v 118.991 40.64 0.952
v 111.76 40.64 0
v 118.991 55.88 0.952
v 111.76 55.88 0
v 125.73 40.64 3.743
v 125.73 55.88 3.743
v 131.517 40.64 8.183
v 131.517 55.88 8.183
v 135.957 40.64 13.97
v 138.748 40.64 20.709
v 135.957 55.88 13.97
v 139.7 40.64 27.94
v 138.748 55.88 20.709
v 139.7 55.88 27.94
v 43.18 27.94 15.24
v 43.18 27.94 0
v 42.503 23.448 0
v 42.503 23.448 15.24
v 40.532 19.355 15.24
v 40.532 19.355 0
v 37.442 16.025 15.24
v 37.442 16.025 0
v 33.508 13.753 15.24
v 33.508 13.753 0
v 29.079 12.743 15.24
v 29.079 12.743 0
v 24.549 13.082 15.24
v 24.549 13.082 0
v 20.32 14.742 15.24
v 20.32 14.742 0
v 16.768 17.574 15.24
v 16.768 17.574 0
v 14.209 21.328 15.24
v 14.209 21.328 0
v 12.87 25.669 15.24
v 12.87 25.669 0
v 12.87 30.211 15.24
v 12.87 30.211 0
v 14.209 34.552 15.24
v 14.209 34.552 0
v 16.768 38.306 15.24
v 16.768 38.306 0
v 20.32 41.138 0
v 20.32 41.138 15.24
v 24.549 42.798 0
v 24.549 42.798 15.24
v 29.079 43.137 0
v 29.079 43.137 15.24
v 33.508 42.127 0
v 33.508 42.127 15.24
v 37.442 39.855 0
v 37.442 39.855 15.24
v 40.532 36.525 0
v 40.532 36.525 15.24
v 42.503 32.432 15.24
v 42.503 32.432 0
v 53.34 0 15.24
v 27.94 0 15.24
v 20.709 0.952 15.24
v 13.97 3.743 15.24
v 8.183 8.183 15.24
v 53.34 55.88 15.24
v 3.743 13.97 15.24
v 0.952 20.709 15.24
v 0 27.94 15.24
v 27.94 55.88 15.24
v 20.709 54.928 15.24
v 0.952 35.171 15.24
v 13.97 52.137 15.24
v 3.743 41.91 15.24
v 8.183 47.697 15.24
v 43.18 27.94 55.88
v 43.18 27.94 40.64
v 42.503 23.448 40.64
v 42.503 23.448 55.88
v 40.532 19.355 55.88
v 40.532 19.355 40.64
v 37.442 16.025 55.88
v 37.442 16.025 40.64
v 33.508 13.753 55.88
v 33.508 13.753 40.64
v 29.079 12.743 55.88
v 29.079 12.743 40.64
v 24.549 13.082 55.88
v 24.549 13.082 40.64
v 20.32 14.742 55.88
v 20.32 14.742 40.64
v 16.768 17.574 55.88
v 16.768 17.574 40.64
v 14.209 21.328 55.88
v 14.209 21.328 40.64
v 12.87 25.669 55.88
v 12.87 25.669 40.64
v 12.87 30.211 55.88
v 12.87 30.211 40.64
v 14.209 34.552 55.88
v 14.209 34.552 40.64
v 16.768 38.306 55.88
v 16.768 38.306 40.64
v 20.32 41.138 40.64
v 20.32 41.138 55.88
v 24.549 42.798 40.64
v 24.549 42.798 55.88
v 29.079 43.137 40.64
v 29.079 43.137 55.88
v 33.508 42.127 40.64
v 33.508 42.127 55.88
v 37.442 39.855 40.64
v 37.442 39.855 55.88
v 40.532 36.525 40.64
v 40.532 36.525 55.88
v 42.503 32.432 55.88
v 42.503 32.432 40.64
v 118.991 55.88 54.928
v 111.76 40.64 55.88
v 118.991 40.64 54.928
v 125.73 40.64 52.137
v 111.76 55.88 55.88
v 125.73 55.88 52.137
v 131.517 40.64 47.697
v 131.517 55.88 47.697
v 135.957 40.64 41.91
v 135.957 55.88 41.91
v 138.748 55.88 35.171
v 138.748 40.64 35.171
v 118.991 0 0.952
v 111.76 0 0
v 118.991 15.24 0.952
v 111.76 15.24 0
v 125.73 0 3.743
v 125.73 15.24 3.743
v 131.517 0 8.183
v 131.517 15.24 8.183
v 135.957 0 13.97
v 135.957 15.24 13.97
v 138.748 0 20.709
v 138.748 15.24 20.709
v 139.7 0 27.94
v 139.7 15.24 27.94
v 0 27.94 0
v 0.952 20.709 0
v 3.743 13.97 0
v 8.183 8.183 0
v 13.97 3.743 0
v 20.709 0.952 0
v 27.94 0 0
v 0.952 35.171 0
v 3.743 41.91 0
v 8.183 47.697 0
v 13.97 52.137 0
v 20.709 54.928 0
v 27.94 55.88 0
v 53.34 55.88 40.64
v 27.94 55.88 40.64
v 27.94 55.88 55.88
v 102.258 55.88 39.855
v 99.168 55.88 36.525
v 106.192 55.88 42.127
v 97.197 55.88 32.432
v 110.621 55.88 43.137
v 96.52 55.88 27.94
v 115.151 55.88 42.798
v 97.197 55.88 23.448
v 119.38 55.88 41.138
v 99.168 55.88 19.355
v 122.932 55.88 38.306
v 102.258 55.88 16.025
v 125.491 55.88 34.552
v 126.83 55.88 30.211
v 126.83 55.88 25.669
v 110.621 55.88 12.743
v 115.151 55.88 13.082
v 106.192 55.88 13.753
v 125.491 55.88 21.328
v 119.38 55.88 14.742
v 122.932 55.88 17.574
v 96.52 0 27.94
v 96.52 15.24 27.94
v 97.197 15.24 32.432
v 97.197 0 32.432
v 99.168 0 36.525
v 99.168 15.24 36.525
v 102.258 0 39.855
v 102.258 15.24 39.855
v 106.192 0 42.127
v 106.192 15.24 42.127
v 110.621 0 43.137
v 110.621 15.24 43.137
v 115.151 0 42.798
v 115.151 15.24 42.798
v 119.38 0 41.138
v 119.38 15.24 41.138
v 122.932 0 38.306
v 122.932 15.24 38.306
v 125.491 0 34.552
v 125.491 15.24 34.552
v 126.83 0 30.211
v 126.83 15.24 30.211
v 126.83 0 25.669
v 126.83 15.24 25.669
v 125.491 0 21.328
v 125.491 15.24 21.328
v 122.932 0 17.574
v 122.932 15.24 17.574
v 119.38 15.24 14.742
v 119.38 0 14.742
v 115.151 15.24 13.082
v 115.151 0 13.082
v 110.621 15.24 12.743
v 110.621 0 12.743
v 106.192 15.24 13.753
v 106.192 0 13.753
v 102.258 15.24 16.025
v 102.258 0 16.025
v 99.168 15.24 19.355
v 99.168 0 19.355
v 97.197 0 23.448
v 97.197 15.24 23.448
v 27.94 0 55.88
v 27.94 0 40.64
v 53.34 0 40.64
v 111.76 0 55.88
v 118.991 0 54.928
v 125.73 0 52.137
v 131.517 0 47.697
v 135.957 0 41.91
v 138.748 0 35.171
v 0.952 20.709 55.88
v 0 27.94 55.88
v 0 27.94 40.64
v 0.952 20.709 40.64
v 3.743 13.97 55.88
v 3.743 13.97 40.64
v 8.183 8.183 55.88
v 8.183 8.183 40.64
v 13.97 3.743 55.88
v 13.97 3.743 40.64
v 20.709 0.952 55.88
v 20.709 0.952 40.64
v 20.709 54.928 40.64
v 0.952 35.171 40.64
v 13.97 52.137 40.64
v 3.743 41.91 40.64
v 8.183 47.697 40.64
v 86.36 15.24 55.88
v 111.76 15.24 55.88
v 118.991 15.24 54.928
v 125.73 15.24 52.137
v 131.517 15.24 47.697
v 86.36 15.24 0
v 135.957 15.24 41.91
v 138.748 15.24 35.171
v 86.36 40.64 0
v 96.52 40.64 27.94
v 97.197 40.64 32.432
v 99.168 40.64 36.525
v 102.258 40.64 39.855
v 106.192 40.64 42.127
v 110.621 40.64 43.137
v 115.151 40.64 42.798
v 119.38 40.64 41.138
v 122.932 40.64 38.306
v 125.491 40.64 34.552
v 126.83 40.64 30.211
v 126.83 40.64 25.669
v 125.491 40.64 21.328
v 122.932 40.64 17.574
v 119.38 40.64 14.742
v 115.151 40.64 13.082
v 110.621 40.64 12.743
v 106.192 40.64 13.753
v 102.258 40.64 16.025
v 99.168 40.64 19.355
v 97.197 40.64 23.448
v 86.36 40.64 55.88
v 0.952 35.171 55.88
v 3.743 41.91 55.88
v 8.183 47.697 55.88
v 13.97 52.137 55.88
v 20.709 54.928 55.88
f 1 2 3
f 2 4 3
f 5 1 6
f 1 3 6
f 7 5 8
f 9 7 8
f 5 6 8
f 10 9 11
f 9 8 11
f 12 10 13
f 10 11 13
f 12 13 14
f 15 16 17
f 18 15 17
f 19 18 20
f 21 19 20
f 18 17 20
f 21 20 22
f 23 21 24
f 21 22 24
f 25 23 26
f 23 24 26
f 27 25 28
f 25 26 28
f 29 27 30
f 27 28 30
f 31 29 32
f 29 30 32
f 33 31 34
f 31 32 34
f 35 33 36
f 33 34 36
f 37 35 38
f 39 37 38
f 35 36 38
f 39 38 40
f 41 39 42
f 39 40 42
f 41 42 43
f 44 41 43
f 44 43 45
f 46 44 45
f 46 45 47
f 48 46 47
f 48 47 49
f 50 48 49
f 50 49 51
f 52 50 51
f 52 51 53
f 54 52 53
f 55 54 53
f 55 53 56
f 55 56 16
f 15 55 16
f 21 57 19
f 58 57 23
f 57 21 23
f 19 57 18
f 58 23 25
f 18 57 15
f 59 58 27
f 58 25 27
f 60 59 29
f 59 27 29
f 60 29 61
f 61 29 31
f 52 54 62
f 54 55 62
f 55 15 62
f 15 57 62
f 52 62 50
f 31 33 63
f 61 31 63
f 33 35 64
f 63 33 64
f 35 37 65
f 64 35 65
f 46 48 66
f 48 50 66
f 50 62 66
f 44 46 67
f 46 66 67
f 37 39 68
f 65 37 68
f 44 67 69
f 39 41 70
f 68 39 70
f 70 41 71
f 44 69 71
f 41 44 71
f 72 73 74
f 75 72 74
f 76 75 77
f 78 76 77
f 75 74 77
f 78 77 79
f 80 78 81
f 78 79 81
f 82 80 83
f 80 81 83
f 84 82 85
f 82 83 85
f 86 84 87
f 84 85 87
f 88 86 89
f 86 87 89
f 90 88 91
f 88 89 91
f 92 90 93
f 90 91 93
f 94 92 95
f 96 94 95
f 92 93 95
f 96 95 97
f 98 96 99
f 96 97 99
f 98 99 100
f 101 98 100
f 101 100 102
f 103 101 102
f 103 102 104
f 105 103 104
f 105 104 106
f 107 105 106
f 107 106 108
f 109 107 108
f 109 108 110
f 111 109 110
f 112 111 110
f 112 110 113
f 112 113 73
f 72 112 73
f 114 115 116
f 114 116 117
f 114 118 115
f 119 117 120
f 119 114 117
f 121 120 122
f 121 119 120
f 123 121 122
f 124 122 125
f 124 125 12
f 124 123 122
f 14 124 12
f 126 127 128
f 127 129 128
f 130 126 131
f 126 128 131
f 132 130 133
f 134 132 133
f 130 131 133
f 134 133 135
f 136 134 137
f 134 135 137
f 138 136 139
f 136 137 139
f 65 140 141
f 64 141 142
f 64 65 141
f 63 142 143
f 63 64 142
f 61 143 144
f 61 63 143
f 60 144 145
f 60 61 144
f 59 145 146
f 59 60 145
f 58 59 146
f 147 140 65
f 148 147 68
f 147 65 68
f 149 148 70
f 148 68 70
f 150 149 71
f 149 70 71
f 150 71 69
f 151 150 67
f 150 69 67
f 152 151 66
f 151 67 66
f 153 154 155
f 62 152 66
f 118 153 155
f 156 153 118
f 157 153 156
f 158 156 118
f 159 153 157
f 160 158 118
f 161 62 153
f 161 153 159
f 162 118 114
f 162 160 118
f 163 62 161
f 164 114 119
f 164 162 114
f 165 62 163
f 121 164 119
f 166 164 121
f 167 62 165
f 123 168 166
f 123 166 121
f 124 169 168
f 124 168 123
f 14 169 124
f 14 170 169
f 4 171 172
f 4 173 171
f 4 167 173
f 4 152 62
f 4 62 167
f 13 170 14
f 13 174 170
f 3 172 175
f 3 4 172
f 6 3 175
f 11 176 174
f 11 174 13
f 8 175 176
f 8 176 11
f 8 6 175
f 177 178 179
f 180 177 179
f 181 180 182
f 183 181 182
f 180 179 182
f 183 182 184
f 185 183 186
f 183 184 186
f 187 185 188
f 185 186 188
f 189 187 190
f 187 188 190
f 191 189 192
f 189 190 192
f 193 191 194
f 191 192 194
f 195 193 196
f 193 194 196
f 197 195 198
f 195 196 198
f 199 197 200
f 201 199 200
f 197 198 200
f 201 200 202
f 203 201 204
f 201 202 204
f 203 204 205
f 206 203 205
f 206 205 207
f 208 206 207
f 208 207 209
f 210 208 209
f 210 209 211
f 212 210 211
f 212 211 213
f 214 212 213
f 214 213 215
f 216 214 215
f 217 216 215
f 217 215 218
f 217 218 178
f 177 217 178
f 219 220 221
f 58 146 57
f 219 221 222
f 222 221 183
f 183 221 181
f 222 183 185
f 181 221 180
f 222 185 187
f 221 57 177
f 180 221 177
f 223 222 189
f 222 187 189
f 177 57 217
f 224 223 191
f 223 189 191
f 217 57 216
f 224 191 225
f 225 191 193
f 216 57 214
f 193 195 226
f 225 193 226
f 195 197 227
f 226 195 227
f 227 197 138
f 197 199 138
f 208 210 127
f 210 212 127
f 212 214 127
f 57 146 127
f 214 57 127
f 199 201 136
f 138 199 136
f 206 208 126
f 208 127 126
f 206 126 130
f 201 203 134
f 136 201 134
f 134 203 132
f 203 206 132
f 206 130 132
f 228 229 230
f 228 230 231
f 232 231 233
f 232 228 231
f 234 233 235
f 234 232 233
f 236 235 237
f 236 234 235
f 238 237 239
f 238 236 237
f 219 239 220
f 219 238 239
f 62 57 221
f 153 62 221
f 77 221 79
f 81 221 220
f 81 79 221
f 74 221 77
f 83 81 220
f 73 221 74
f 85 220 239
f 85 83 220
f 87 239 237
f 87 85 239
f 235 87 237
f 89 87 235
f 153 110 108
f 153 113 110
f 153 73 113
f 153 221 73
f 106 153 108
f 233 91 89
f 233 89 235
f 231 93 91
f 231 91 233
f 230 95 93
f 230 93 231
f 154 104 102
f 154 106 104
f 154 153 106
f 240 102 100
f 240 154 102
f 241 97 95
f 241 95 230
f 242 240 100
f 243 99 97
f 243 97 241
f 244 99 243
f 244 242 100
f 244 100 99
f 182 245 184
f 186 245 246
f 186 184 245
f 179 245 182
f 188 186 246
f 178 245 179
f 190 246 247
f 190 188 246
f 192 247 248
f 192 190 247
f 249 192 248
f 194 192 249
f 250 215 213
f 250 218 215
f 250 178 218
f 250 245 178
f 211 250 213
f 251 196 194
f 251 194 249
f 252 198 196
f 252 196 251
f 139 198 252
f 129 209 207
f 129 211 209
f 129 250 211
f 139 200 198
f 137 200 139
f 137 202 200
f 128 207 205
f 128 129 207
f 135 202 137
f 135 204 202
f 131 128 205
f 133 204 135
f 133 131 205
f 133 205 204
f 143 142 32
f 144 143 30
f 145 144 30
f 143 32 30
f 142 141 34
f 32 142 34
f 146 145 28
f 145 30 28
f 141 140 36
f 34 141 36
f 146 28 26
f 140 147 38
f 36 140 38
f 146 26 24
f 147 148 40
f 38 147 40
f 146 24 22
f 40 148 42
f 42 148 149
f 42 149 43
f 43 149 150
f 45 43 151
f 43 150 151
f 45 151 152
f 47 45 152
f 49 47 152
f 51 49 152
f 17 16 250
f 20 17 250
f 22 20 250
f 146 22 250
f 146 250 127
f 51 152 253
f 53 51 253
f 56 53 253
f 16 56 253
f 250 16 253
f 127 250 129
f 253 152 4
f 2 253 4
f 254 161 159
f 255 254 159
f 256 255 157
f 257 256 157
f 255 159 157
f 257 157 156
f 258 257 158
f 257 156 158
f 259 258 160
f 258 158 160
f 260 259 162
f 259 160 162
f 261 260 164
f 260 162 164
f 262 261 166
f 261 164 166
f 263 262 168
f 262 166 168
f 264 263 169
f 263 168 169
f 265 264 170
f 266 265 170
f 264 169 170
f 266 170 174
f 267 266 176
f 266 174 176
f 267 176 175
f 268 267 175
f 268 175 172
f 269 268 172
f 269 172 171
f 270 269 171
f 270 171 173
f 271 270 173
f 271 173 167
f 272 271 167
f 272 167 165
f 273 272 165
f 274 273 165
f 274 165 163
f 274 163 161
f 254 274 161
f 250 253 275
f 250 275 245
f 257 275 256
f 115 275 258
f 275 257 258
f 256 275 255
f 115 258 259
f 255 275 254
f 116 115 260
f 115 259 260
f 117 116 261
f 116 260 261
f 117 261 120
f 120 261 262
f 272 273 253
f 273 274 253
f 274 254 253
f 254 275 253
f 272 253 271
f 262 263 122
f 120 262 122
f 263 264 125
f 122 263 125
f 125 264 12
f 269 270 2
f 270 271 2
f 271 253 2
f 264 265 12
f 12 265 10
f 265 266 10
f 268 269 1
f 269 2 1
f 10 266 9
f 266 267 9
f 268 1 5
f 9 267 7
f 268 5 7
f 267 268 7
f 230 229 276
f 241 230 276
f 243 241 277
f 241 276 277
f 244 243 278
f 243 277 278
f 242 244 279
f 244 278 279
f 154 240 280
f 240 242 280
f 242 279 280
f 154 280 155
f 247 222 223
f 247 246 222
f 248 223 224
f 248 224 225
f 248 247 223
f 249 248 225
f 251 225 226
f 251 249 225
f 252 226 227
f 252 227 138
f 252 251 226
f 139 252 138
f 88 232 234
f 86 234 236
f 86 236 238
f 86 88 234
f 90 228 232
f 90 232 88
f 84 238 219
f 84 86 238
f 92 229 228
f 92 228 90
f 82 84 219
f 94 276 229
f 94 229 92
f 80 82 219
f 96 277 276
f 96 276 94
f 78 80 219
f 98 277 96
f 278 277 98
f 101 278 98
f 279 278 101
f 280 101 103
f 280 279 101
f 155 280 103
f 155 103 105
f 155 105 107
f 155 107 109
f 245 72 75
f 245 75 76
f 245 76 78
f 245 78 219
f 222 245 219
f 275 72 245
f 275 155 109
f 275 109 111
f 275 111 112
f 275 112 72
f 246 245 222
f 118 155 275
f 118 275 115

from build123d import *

# Parameters (mm, degrees)
F0_W      = 139.7
F0_H      = 55.88
F1_DEPTH  = 55.88
F2_W      = 101.6
F2_H      = 25.4
F3_DEPTH  = 55.881
F4_R      = 27.93999
F5_R      = 15.24
F6_DEPTH  = 55.881
F7_W      = 76.2
F7_H      = 25.4
F8_DEPTH  = 55.881
F9_R      = 15.24
F10_DEPTH = 55.881


# Not quite as in the source:
# - a fillet or chamfer is up to 0.001 mm smaller than in the source, because OpenCascade refuses the exact size


with BuildPart() as f1:
    # F0 (on Top) → F1 (new body)
    with BuildSketch(Plane.XY):
        with Locations((69.85, 27.94)):
            Rectangle(F0_W, F0_H)
    extrude(amount=F1_DEPTH)

    # F2 (on face) → F3 (cut, through all)
    with BuildSketch(Plane(origin=(0, 0, 0), x_dir=(1, 0, 0), z_dir=(0, 0, -1))):
        with Locations((137.16, -27.94)):
            Rectangle(F2_W, F2_H)
    extrude(amount=-F3_DEPTH, mode=Mode.SUBTRACT)

    # F4 (radius 27.94 in the source; OpenCascade refuses exactly that, so slightly less here)
    f4_edges = [f1.edges().sort_by_distance(p)[0] for p in [
        (139.7, 48.26, 55.88),
        (139.7, 7.62, 55.88),
        (139.7, 7.62, 0),
        (139.7, 48.26, 0),
        (0, 55.88, 27.94),
        (0, 0, 27.94),
    ]]
    fillet(f4_edges, radius=F4_R)

    # F5 (on face) → F6 (cut, through all)
    with BuildSketch(Plane(origin=(0, 55.88, 0), x_dir=(-1, 0, 0), z_dir=(0, 1, 0))):
        with Locations((-111.76, 27.94)):
            Circle(F5_R)
    extrude(amount=-F6_DEPTH, mode=Mode.SUBTRACT)

    # F7 (on face) → F8 (cut, through all)
    with BuildSketch(Plane(origin=(0, 55.88, 0), x_dir=(-1, 0, 0), z_dir=(0, 1, 0))):
        with Locations((-15.24, 27.94)):
            Rectangle(F7_W, F7_H)
    extrude(amount=-F8_DEPTH, mode=Mode.SUBTRACT)

    # F9 (on face) → F10 (cut, through all)
    with BuildSketch(Plane(origin=(0, 0, 0), x_dir=(1, 0, 0), z_dir=(0, 0, -1))):
        with Locations((27.94, -27.94)):
            Circle(F9_R)
    extrude(amount=-F10_DEPTH, mode=Mode.SUBTRACT)


solid = f1.part
